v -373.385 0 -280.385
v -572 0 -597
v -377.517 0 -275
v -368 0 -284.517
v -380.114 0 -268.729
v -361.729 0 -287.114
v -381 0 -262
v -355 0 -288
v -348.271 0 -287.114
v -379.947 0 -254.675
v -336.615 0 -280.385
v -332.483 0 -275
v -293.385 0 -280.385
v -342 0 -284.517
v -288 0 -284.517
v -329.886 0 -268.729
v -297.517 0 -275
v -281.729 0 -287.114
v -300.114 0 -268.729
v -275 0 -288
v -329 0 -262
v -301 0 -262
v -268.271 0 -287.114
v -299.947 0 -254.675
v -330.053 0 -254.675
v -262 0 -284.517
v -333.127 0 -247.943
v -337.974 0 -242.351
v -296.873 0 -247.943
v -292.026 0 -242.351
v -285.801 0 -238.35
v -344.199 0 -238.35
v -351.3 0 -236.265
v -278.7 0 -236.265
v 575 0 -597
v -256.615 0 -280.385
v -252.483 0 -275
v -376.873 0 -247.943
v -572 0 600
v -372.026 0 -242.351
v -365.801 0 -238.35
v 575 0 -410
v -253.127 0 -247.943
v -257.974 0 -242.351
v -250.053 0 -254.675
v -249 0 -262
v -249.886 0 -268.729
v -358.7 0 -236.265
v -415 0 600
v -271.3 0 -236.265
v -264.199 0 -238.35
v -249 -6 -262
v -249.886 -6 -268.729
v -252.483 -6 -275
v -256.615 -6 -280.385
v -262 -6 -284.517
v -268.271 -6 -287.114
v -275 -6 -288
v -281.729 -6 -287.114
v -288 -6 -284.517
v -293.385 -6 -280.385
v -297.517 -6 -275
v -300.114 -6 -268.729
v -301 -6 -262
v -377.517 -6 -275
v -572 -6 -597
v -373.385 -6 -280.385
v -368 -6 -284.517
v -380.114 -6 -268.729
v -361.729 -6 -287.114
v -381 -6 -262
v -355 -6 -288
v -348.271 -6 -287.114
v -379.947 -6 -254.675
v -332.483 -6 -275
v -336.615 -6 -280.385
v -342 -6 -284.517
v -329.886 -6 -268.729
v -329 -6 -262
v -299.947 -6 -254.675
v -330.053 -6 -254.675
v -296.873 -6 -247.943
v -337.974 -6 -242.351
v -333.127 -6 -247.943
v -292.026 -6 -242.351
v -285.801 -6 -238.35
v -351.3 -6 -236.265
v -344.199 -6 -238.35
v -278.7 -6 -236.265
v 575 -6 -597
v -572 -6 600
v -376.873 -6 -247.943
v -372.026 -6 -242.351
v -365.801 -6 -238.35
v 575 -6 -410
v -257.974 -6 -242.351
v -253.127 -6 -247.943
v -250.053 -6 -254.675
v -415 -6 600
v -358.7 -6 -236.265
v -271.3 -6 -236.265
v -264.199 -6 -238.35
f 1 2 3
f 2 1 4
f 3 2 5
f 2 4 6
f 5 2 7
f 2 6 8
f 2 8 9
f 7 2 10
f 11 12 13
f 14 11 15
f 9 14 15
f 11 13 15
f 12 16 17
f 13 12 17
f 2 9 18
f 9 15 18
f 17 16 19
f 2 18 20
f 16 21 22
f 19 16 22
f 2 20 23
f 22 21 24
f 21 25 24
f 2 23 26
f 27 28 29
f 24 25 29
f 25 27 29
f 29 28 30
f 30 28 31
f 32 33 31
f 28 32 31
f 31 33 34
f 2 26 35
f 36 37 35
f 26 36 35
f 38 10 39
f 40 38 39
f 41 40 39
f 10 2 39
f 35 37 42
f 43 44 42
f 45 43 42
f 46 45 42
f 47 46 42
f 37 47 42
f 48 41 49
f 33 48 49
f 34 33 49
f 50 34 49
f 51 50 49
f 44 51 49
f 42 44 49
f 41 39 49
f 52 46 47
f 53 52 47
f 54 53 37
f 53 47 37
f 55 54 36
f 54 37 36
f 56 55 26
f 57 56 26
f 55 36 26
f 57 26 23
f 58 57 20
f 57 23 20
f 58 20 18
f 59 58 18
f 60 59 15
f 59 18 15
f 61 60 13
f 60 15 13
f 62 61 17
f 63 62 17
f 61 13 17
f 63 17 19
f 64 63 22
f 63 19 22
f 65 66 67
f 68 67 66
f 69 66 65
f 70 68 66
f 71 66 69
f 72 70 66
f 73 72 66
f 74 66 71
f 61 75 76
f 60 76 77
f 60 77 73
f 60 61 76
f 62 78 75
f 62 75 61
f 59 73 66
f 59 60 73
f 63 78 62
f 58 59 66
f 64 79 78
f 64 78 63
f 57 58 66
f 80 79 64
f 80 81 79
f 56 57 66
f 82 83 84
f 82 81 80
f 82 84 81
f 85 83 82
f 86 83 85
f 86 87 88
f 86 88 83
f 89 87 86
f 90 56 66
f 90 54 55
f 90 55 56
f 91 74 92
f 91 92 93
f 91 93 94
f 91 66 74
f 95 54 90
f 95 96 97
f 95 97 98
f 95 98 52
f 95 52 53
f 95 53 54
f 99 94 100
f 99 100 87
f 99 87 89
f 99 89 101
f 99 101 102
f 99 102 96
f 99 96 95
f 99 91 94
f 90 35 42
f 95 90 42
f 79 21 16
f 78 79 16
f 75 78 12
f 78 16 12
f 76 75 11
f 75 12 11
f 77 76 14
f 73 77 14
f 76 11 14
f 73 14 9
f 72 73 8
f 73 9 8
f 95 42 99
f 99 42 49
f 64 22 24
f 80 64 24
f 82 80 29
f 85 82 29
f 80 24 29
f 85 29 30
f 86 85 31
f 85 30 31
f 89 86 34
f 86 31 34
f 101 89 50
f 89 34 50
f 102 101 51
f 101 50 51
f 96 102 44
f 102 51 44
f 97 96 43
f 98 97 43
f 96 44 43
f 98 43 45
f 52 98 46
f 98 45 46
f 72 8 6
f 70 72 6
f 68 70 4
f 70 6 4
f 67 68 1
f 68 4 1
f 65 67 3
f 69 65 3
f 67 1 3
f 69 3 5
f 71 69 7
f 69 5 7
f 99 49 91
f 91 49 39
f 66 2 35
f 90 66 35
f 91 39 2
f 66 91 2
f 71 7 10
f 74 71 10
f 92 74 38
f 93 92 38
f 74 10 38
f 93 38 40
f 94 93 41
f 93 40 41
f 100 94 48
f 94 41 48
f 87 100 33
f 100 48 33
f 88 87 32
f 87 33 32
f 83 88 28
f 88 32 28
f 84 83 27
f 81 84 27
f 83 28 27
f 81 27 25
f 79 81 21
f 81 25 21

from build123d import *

# Parameters (mm, degrees)
F1_DEPTH = 6


with BuildPart() as f1:
    # F0 (on Front) → F1 (new body)
    with BuildSketch(Plane.XZ):
        with BuildLine():
            Line((-415, 600), (-572, 600))
            Line((-572, 600), (-572, -262))
            Line((-572, -262), (-381, -262))
            ThreePointArc((-381, -262), (-355, -236), (-329, -262))
            Line((-329, -262), (-301, -262))
            ThreePointArc((-301, -262), (-275, -236), (-249, -262))
            ThreePointArc((-249, -262), (-256.6152236891, -280.3847763109), (-275, -288))
            Line((-275, -288), (-275, -597))
            Line((-275, -597), (575, -597))
            Line((575, -597), (575, -410))
            Line((575, -410), (-415, 600))
        make_face()
        with BuildLine():
            Line((-381, -262), (-572, -262))
            Line((-572, -262), (-572, -597))
            Line((-572, -597), (-355, -597))
            Line((-355, -597), (-355, -288))
            ThreePointArc((-355, -288), (-373.3847763109, -280.3847763109), (-381, -262))
        make_face()
        with BuildLine():
            Line((-301, -262), (-329, -262))
            ThreePointArc((-329, -262), (-336.6152236891, -280.3847763109), (-355, -288))
            Line((-355, -288), (-355, -597))
            Line((-355, -597), (-275, -597))
            Line((-275, -597), (-275, -288))
            ThreePointArc((-275, -288), (-293.3847763109, -280.3847763109), (-301, -262))
        make_face()
    extrude(amount=F1_DEPTH)


solid = f1.part
